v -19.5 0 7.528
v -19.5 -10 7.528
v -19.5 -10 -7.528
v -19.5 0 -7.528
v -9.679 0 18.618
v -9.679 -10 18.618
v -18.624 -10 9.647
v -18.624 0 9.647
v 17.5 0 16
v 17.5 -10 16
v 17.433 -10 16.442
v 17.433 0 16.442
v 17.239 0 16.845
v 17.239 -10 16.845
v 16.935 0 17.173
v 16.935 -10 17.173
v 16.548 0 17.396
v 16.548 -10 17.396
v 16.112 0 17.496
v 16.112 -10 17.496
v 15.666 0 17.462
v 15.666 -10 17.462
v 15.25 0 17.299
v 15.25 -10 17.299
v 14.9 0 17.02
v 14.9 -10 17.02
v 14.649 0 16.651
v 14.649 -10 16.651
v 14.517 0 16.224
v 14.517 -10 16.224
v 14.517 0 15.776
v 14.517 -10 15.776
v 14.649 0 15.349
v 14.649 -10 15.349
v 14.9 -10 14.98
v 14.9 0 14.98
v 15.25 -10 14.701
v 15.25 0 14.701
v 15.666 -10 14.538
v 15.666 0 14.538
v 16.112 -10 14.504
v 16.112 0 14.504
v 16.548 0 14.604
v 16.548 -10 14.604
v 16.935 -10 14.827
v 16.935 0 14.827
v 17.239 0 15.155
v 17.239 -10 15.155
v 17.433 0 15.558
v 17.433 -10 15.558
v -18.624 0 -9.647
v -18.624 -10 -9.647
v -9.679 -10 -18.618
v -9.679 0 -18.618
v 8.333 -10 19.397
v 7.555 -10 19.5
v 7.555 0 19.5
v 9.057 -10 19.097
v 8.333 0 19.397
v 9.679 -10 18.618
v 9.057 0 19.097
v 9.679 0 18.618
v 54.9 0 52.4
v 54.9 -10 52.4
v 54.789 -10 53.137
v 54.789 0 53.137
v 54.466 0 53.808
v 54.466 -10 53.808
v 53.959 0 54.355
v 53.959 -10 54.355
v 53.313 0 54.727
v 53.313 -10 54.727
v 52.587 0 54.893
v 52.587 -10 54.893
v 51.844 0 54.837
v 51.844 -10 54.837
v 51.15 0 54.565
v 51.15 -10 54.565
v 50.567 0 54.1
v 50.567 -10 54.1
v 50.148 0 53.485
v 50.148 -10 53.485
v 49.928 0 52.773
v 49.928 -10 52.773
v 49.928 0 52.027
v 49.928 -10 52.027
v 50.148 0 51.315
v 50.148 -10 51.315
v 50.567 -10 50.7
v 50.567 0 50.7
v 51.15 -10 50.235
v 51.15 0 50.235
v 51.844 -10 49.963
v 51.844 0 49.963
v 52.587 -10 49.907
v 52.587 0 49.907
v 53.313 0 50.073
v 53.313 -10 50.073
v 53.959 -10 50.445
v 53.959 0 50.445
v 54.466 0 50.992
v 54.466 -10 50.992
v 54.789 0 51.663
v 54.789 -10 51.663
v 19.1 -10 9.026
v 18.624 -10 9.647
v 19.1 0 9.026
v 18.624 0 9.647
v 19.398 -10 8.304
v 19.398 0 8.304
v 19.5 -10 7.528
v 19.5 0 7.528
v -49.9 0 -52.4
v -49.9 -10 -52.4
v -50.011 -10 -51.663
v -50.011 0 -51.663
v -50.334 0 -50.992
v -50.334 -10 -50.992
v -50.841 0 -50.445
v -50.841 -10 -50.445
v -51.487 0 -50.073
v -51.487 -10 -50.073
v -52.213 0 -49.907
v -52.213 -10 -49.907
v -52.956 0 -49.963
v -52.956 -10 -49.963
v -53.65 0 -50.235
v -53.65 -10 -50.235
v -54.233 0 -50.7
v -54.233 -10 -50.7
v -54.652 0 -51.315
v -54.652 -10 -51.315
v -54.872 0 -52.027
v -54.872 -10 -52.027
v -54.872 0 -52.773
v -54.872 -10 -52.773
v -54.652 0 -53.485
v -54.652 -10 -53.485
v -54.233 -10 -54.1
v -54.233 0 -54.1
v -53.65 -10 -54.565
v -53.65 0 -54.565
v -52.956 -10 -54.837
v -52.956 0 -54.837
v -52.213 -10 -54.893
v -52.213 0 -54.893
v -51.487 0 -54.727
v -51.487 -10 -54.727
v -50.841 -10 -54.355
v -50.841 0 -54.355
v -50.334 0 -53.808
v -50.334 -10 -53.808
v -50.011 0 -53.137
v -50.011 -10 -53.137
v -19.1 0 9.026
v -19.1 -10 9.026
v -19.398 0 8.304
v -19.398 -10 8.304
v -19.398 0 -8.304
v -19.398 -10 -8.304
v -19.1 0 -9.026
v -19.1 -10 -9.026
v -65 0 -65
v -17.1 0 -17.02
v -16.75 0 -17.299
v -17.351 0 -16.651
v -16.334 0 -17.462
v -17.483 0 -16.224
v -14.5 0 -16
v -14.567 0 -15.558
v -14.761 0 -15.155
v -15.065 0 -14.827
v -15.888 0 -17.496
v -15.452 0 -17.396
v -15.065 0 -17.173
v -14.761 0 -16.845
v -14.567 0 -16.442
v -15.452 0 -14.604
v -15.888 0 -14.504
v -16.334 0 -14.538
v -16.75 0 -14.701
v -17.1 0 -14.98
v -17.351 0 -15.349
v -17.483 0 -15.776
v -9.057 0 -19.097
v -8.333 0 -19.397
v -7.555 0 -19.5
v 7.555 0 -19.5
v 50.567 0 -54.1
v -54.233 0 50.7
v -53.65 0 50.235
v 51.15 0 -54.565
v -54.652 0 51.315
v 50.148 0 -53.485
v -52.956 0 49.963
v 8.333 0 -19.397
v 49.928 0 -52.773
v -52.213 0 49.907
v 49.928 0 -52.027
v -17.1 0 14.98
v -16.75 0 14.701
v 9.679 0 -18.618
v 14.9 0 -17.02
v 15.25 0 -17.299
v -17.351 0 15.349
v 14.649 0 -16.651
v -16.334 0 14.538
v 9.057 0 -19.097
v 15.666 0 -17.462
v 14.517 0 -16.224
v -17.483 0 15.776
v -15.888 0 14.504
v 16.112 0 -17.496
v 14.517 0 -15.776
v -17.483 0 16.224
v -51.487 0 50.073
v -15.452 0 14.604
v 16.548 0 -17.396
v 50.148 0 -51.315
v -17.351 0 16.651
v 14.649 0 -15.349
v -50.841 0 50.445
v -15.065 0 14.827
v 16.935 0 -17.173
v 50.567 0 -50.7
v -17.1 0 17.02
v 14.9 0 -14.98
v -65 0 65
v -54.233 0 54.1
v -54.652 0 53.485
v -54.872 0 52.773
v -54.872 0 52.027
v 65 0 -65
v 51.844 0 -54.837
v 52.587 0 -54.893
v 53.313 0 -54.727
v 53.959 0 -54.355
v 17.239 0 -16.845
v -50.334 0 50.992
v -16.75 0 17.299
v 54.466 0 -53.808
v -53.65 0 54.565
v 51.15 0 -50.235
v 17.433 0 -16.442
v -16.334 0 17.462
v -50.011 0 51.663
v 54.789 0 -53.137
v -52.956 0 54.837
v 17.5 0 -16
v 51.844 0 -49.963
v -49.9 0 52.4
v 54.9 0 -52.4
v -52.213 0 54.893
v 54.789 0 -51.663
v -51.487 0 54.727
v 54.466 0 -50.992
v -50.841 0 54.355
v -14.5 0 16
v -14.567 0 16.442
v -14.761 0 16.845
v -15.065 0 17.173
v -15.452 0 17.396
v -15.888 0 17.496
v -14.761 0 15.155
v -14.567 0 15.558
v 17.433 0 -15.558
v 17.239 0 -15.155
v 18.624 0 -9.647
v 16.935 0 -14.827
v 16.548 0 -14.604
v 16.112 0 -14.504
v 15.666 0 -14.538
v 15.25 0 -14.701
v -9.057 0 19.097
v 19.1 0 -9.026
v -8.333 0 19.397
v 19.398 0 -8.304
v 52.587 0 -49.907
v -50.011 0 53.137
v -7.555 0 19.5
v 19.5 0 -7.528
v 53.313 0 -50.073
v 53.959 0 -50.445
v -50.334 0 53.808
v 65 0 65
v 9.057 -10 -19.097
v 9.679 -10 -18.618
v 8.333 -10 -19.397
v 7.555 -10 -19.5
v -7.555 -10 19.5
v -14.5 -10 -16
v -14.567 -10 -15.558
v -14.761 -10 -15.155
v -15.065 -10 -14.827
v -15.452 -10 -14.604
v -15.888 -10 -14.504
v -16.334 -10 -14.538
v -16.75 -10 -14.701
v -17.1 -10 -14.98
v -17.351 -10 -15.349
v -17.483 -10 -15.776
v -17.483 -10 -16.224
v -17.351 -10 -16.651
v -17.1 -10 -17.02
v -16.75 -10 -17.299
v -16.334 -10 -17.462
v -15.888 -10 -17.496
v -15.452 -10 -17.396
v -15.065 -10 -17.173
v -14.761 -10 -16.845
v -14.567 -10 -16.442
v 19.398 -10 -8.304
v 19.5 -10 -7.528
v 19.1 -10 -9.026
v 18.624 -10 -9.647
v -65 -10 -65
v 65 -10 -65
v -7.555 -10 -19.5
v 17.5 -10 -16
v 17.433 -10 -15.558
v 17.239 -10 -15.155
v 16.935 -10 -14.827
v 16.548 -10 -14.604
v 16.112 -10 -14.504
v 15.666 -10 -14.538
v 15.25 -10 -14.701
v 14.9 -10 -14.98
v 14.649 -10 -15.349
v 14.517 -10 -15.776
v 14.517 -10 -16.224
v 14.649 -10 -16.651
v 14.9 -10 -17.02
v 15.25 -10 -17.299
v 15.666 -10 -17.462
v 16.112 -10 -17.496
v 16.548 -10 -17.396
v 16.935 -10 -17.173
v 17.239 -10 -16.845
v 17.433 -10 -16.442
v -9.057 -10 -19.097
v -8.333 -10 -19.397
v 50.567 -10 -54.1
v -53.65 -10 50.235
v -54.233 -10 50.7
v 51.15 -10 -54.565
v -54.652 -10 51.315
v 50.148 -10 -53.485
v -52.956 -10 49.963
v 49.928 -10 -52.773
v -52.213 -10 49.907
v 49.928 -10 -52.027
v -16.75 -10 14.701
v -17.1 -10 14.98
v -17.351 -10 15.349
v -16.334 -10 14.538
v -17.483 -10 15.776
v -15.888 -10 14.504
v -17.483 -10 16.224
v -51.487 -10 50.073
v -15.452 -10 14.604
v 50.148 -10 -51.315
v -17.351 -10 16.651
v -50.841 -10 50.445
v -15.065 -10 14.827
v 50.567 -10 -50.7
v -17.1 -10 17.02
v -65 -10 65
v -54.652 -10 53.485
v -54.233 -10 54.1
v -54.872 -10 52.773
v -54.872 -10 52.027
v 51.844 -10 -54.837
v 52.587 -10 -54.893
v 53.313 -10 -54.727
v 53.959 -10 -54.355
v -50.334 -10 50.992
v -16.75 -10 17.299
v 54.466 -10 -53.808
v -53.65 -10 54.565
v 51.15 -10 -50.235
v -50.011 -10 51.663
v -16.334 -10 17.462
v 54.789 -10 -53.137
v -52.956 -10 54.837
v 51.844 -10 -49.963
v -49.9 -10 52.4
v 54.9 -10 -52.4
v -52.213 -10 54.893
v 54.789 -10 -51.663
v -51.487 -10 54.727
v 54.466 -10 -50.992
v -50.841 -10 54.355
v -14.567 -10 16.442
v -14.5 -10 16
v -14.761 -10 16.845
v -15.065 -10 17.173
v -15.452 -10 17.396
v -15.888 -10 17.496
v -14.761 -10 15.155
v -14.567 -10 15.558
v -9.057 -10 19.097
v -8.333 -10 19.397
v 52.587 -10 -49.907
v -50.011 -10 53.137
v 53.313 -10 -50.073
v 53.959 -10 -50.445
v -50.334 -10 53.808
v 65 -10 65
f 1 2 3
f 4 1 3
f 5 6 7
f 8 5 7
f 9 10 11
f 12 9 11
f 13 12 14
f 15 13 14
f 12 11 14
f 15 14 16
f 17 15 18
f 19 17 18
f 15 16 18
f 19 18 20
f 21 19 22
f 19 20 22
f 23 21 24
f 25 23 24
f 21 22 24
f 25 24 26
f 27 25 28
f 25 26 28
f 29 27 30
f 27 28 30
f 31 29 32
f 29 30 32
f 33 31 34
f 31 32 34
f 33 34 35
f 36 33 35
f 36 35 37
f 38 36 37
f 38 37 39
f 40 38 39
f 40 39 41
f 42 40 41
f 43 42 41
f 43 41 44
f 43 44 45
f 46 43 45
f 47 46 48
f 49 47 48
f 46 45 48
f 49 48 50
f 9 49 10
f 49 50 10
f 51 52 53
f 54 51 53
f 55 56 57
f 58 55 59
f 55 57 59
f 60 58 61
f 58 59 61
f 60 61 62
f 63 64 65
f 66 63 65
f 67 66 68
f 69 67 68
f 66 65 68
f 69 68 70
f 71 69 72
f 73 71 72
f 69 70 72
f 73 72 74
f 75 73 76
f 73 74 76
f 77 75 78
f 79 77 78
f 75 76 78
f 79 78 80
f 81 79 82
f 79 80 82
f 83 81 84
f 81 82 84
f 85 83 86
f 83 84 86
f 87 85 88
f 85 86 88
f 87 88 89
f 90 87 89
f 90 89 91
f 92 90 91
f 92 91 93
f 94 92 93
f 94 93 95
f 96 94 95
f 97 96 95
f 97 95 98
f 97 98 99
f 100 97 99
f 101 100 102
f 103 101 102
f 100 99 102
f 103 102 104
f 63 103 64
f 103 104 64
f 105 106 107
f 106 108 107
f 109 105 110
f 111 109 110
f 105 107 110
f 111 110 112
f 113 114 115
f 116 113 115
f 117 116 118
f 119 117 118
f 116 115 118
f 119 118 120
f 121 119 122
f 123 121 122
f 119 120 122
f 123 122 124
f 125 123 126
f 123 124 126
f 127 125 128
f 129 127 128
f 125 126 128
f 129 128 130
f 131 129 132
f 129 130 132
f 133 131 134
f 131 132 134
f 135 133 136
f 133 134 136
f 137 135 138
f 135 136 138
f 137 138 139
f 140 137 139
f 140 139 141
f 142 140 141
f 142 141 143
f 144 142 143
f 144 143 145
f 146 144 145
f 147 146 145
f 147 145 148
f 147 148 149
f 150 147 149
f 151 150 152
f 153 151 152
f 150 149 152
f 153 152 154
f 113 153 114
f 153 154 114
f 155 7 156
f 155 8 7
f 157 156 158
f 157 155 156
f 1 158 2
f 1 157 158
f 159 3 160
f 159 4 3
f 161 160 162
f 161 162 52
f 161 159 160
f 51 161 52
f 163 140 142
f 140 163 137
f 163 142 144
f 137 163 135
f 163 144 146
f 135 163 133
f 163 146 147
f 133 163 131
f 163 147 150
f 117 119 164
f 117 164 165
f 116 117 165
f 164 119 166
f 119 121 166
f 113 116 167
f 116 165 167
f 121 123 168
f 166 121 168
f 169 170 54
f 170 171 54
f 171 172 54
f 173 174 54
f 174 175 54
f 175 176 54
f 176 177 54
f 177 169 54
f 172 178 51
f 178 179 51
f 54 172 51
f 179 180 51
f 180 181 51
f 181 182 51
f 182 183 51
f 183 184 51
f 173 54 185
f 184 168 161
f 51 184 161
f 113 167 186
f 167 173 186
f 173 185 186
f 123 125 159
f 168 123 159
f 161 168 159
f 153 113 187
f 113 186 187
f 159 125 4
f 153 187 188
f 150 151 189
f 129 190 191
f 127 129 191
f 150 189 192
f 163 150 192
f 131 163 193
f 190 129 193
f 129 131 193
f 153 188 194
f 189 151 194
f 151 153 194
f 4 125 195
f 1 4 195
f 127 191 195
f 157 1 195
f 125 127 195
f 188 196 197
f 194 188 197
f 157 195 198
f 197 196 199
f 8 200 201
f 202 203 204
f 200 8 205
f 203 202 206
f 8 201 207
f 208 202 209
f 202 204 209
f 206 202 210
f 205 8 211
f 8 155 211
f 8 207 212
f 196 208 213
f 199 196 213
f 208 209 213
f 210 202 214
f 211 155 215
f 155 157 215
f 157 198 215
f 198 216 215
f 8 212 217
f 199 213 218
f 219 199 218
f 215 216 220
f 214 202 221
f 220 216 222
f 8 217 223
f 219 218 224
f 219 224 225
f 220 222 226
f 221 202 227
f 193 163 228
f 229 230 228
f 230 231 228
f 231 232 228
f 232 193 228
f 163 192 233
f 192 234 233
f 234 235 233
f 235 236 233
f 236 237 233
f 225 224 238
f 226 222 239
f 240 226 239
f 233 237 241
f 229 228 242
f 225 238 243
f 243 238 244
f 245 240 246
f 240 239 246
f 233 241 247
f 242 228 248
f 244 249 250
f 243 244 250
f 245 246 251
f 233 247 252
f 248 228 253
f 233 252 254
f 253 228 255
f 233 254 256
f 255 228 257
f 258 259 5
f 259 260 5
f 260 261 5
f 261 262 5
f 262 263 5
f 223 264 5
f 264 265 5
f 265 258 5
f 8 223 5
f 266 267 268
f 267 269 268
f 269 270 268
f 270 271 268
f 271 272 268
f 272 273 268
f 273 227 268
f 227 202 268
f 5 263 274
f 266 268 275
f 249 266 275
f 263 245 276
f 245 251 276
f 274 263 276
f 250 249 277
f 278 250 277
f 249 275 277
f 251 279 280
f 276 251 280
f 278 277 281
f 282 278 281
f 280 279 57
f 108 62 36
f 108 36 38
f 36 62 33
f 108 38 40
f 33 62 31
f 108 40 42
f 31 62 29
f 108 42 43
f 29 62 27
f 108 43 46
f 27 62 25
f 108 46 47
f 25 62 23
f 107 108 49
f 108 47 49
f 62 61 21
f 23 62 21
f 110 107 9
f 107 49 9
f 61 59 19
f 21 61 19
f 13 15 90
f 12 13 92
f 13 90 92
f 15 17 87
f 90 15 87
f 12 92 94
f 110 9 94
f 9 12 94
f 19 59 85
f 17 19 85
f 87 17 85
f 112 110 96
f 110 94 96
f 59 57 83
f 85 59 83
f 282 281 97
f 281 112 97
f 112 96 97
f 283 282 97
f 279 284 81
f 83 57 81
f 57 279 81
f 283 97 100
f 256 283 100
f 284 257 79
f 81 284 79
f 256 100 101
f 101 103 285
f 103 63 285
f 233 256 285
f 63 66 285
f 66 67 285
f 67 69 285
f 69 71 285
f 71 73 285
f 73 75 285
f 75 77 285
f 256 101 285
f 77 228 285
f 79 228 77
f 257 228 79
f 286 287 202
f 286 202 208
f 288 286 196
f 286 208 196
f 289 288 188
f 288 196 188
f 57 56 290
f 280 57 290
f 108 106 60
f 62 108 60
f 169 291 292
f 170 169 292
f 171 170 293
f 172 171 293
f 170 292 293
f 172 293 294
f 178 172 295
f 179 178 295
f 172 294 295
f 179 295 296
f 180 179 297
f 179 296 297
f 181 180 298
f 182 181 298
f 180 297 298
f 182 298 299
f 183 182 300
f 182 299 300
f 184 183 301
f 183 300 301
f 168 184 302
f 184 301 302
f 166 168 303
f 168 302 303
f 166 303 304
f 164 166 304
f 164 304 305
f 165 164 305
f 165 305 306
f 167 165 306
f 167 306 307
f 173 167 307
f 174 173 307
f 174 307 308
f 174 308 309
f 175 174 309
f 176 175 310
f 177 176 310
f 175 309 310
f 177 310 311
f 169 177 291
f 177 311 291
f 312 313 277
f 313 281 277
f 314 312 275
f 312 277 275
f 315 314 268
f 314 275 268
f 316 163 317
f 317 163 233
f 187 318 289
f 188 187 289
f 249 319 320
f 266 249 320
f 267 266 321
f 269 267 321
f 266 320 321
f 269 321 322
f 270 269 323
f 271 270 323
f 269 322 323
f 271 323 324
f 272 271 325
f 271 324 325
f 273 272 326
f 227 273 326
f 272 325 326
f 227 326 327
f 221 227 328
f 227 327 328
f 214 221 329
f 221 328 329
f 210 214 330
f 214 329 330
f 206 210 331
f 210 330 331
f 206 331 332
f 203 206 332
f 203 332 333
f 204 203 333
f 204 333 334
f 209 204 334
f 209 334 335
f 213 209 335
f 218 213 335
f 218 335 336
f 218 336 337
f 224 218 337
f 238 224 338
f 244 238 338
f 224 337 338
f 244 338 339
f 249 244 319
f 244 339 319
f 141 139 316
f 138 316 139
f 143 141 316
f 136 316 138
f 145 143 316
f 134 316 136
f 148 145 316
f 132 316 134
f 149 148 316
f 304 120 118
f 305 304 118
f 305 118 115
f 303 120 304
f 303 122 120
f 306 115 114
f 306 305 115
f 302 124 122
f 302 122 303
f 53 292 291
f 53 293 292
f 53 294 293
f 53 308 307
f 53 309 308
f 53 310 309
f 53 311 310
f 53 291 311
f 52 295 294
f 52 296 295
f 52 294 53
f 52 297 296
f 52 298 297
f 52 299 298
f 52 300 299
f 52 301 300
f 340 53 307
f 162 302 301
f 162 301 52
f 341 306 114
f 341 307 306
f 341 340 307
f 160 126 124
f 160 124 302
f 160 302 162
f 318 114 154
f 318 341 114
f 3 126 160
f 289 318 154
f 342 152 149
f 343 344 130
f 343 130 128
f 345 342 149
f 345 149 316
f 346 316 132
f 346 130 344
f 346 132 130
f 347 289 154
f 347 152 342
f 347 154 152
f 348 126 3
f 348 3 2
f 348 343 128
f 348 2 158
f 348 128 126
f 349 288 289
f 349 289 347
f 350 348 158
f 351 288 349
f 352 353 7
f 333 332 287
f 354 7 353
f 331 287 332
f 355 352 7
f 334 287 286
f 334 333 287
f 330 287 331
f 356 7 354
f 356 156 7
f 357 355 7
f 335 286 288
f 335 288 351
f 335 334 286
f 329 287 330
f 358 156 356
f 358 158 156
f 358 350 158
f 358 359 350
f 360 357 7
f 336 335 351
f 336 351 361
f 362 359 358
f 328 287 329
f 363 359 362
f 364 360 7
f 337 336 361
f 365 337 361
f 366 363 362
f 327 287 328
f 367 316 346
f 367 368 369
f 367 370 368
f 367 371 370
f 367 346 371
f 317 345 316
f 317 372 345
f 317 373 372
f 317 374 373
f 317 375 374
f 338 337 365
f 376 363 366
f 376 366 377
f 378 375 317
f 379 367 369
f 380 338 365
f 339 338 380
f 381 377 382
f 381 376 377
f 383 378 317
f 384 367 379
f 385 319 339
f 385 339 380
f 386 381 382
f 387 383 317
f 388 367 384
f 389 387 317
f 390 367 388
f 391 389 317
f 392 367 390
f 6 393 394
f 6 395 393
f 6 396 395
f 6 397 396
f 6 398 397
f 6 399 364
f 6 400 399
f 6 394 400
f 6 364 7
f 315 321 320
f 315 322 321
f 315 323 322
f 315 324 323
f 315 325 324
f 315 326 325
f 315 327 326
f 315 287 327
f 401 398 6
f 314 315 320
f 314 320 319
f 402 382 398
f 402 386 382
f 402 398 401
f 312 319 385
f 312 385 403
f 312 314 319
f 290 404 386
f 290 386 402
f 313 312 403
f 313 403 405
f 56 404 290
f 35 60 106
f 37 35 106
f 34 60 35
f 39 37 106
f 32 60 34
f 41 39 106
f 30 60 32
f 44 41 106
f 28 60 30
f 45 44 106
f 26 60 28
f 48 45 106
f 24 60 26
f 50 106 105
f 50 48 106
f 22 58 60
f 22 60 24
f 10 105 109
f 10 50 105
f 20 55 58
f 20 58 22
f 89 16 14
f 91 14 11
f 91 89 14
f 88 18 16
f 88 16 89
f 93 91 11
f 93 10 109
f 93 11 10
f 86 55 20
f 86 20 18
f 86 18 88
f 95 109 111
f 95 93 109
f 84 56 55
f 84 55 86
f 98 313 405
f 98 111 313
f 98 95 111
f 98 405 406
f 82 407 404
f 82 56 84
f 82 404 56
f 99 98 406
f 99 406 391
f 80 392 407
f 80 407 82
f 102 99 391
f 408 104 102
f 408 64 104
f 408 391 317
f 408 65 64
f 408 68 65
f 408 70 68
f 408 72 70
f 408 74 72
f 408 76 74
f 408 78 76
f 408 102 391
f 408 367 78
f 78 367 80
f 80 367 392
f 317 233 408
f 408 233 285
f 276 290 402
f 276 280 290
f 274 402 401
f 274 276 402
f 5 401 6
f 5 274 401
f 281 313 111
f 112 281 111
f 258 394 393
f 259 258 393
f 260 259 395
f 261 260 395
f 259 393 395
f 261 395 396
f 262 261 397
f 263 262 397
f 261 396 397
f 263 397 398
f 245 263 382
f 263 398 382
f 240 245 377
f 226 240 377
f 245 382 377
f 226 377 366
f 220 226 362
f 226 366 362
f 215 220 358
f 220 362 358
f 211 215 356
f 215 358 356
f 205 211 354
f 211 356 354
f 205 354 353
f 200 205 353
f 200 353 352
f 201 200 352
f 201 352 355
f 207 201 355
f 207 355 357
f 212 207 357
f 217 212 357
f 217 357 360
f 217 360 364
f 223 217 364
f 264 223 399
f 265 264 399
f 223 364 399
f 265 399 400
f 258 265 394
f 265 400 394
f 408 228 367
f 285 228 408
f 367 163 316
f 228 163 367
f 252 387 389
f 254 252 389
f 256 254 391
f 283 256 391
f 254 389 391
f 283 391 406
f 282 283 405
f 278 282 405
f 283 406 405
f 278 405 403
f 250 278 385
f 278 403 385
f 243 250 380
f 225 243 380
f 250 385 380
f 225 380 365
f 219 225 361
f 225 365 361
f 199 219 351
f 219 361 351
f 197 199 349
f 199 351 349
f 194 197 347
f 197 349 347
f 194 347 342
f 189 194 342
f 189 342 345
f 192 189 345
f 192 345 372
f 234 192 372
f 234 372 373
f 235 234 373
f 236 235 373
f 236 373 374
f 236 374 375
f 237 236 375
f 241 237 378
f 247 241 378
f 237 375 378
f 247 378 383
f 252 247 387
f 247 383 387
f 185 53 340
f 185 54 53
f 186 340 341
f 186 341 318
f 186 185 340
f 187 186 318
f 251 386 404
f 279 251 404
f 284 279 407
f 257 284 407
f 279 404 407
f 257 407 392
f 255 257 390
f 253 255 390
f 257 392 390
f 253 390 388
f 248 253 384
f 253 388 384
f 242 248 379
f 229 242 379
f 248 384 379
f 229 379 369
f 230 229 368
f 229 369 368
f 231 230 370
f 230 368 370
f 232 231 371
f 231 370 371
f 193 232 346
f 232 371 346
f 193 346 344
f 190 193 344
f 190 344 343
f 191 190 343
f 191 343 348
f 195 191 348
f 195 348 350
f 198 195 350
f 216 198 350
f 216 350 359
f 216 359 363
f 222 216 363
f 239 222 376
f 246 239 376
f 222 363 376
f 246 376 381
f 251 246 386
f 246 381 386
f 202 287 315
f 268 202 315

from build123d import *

# Parameters (mm, degrees)
F0_W     = 130
F0_H     = 130
F1_DEPTH = 10
F3_DEPTH = 10
F4_R     = 1.5
F5_DEPTH = 10
F6_R     = 2.5
F7_DEPTH = 10
F8_R     = 3


with BuildPart() as f1:
    # F0 (on Front) → F1 (new body)
    with BuildSketch(Plane.XZ):
        Rectangle(F0_W, F0_H)
    extrude(amount=F1_DEPTH)

    # F2 (on face) → F3 (cut, through all)
    with BuildSketch(Plane.XZ.offset(10)):
        Polygon((8.8, 19.5), (-8.8, 19.5), (-19.5, 8.768557), (-19.5, -8.768557), (-8.8, -19.5), (8.8, -19.5), (19.5, -8.768557), (19.5, 8.768557), align=None)
    extrude(amount=-F3_DEPTH, mode=Mode.SUBTRACT)

    # F4 (on face) → F5 (cut, through all)
    with BuildSketch(Plane.XZ.offset(10)):
        with Locations((16, 16)):
            Circle(F4_R)
        with Locations((16, -16)):
            Circle(F4_R)
        with Locations((-16, 16)):
            Circle(F4_R)
        with Locations((-16, -16)):
            Circle(F4_R)
    extrude(amount=-F5_DEPTH, mode=Mode.SUBTRACT)

    # F6 (on face) → F7 (cut, through all)
    with BuildSketch(Plane.XZ.offset(10)):
        with Locations((52.4, 52.4)):
            Circle(F6_R)
        with Locations((52.4, -52.4)):
            Circle(F6_R)
        with Locations((-52.4, 52.4)):
            Circle(F6_R)
        with Locations((-52.4, -52.4)):
            Circle(F6_R)
    extrude(amount=-F7_DEPTH, mode=Mode.SUBTRACT)

    # F8
    f8_edges = [f1.edges().sort_by_distance(p)[0] for p in [
        (-19.5, -5, 8.768557),
        (-8.8, -5, 19.5),
        (-19.5, -5, -8.768557),
        (-8.8, -5, -19.5),
        (8.8, -5, -19.5),
        (19.5, -5, -8.768557),
        (19.5, -5, 8.768557),
        (8.8, -5, 19.5),
    ]]
    fillet(f8_edges, radius=F8_R)


solid = f1.part
